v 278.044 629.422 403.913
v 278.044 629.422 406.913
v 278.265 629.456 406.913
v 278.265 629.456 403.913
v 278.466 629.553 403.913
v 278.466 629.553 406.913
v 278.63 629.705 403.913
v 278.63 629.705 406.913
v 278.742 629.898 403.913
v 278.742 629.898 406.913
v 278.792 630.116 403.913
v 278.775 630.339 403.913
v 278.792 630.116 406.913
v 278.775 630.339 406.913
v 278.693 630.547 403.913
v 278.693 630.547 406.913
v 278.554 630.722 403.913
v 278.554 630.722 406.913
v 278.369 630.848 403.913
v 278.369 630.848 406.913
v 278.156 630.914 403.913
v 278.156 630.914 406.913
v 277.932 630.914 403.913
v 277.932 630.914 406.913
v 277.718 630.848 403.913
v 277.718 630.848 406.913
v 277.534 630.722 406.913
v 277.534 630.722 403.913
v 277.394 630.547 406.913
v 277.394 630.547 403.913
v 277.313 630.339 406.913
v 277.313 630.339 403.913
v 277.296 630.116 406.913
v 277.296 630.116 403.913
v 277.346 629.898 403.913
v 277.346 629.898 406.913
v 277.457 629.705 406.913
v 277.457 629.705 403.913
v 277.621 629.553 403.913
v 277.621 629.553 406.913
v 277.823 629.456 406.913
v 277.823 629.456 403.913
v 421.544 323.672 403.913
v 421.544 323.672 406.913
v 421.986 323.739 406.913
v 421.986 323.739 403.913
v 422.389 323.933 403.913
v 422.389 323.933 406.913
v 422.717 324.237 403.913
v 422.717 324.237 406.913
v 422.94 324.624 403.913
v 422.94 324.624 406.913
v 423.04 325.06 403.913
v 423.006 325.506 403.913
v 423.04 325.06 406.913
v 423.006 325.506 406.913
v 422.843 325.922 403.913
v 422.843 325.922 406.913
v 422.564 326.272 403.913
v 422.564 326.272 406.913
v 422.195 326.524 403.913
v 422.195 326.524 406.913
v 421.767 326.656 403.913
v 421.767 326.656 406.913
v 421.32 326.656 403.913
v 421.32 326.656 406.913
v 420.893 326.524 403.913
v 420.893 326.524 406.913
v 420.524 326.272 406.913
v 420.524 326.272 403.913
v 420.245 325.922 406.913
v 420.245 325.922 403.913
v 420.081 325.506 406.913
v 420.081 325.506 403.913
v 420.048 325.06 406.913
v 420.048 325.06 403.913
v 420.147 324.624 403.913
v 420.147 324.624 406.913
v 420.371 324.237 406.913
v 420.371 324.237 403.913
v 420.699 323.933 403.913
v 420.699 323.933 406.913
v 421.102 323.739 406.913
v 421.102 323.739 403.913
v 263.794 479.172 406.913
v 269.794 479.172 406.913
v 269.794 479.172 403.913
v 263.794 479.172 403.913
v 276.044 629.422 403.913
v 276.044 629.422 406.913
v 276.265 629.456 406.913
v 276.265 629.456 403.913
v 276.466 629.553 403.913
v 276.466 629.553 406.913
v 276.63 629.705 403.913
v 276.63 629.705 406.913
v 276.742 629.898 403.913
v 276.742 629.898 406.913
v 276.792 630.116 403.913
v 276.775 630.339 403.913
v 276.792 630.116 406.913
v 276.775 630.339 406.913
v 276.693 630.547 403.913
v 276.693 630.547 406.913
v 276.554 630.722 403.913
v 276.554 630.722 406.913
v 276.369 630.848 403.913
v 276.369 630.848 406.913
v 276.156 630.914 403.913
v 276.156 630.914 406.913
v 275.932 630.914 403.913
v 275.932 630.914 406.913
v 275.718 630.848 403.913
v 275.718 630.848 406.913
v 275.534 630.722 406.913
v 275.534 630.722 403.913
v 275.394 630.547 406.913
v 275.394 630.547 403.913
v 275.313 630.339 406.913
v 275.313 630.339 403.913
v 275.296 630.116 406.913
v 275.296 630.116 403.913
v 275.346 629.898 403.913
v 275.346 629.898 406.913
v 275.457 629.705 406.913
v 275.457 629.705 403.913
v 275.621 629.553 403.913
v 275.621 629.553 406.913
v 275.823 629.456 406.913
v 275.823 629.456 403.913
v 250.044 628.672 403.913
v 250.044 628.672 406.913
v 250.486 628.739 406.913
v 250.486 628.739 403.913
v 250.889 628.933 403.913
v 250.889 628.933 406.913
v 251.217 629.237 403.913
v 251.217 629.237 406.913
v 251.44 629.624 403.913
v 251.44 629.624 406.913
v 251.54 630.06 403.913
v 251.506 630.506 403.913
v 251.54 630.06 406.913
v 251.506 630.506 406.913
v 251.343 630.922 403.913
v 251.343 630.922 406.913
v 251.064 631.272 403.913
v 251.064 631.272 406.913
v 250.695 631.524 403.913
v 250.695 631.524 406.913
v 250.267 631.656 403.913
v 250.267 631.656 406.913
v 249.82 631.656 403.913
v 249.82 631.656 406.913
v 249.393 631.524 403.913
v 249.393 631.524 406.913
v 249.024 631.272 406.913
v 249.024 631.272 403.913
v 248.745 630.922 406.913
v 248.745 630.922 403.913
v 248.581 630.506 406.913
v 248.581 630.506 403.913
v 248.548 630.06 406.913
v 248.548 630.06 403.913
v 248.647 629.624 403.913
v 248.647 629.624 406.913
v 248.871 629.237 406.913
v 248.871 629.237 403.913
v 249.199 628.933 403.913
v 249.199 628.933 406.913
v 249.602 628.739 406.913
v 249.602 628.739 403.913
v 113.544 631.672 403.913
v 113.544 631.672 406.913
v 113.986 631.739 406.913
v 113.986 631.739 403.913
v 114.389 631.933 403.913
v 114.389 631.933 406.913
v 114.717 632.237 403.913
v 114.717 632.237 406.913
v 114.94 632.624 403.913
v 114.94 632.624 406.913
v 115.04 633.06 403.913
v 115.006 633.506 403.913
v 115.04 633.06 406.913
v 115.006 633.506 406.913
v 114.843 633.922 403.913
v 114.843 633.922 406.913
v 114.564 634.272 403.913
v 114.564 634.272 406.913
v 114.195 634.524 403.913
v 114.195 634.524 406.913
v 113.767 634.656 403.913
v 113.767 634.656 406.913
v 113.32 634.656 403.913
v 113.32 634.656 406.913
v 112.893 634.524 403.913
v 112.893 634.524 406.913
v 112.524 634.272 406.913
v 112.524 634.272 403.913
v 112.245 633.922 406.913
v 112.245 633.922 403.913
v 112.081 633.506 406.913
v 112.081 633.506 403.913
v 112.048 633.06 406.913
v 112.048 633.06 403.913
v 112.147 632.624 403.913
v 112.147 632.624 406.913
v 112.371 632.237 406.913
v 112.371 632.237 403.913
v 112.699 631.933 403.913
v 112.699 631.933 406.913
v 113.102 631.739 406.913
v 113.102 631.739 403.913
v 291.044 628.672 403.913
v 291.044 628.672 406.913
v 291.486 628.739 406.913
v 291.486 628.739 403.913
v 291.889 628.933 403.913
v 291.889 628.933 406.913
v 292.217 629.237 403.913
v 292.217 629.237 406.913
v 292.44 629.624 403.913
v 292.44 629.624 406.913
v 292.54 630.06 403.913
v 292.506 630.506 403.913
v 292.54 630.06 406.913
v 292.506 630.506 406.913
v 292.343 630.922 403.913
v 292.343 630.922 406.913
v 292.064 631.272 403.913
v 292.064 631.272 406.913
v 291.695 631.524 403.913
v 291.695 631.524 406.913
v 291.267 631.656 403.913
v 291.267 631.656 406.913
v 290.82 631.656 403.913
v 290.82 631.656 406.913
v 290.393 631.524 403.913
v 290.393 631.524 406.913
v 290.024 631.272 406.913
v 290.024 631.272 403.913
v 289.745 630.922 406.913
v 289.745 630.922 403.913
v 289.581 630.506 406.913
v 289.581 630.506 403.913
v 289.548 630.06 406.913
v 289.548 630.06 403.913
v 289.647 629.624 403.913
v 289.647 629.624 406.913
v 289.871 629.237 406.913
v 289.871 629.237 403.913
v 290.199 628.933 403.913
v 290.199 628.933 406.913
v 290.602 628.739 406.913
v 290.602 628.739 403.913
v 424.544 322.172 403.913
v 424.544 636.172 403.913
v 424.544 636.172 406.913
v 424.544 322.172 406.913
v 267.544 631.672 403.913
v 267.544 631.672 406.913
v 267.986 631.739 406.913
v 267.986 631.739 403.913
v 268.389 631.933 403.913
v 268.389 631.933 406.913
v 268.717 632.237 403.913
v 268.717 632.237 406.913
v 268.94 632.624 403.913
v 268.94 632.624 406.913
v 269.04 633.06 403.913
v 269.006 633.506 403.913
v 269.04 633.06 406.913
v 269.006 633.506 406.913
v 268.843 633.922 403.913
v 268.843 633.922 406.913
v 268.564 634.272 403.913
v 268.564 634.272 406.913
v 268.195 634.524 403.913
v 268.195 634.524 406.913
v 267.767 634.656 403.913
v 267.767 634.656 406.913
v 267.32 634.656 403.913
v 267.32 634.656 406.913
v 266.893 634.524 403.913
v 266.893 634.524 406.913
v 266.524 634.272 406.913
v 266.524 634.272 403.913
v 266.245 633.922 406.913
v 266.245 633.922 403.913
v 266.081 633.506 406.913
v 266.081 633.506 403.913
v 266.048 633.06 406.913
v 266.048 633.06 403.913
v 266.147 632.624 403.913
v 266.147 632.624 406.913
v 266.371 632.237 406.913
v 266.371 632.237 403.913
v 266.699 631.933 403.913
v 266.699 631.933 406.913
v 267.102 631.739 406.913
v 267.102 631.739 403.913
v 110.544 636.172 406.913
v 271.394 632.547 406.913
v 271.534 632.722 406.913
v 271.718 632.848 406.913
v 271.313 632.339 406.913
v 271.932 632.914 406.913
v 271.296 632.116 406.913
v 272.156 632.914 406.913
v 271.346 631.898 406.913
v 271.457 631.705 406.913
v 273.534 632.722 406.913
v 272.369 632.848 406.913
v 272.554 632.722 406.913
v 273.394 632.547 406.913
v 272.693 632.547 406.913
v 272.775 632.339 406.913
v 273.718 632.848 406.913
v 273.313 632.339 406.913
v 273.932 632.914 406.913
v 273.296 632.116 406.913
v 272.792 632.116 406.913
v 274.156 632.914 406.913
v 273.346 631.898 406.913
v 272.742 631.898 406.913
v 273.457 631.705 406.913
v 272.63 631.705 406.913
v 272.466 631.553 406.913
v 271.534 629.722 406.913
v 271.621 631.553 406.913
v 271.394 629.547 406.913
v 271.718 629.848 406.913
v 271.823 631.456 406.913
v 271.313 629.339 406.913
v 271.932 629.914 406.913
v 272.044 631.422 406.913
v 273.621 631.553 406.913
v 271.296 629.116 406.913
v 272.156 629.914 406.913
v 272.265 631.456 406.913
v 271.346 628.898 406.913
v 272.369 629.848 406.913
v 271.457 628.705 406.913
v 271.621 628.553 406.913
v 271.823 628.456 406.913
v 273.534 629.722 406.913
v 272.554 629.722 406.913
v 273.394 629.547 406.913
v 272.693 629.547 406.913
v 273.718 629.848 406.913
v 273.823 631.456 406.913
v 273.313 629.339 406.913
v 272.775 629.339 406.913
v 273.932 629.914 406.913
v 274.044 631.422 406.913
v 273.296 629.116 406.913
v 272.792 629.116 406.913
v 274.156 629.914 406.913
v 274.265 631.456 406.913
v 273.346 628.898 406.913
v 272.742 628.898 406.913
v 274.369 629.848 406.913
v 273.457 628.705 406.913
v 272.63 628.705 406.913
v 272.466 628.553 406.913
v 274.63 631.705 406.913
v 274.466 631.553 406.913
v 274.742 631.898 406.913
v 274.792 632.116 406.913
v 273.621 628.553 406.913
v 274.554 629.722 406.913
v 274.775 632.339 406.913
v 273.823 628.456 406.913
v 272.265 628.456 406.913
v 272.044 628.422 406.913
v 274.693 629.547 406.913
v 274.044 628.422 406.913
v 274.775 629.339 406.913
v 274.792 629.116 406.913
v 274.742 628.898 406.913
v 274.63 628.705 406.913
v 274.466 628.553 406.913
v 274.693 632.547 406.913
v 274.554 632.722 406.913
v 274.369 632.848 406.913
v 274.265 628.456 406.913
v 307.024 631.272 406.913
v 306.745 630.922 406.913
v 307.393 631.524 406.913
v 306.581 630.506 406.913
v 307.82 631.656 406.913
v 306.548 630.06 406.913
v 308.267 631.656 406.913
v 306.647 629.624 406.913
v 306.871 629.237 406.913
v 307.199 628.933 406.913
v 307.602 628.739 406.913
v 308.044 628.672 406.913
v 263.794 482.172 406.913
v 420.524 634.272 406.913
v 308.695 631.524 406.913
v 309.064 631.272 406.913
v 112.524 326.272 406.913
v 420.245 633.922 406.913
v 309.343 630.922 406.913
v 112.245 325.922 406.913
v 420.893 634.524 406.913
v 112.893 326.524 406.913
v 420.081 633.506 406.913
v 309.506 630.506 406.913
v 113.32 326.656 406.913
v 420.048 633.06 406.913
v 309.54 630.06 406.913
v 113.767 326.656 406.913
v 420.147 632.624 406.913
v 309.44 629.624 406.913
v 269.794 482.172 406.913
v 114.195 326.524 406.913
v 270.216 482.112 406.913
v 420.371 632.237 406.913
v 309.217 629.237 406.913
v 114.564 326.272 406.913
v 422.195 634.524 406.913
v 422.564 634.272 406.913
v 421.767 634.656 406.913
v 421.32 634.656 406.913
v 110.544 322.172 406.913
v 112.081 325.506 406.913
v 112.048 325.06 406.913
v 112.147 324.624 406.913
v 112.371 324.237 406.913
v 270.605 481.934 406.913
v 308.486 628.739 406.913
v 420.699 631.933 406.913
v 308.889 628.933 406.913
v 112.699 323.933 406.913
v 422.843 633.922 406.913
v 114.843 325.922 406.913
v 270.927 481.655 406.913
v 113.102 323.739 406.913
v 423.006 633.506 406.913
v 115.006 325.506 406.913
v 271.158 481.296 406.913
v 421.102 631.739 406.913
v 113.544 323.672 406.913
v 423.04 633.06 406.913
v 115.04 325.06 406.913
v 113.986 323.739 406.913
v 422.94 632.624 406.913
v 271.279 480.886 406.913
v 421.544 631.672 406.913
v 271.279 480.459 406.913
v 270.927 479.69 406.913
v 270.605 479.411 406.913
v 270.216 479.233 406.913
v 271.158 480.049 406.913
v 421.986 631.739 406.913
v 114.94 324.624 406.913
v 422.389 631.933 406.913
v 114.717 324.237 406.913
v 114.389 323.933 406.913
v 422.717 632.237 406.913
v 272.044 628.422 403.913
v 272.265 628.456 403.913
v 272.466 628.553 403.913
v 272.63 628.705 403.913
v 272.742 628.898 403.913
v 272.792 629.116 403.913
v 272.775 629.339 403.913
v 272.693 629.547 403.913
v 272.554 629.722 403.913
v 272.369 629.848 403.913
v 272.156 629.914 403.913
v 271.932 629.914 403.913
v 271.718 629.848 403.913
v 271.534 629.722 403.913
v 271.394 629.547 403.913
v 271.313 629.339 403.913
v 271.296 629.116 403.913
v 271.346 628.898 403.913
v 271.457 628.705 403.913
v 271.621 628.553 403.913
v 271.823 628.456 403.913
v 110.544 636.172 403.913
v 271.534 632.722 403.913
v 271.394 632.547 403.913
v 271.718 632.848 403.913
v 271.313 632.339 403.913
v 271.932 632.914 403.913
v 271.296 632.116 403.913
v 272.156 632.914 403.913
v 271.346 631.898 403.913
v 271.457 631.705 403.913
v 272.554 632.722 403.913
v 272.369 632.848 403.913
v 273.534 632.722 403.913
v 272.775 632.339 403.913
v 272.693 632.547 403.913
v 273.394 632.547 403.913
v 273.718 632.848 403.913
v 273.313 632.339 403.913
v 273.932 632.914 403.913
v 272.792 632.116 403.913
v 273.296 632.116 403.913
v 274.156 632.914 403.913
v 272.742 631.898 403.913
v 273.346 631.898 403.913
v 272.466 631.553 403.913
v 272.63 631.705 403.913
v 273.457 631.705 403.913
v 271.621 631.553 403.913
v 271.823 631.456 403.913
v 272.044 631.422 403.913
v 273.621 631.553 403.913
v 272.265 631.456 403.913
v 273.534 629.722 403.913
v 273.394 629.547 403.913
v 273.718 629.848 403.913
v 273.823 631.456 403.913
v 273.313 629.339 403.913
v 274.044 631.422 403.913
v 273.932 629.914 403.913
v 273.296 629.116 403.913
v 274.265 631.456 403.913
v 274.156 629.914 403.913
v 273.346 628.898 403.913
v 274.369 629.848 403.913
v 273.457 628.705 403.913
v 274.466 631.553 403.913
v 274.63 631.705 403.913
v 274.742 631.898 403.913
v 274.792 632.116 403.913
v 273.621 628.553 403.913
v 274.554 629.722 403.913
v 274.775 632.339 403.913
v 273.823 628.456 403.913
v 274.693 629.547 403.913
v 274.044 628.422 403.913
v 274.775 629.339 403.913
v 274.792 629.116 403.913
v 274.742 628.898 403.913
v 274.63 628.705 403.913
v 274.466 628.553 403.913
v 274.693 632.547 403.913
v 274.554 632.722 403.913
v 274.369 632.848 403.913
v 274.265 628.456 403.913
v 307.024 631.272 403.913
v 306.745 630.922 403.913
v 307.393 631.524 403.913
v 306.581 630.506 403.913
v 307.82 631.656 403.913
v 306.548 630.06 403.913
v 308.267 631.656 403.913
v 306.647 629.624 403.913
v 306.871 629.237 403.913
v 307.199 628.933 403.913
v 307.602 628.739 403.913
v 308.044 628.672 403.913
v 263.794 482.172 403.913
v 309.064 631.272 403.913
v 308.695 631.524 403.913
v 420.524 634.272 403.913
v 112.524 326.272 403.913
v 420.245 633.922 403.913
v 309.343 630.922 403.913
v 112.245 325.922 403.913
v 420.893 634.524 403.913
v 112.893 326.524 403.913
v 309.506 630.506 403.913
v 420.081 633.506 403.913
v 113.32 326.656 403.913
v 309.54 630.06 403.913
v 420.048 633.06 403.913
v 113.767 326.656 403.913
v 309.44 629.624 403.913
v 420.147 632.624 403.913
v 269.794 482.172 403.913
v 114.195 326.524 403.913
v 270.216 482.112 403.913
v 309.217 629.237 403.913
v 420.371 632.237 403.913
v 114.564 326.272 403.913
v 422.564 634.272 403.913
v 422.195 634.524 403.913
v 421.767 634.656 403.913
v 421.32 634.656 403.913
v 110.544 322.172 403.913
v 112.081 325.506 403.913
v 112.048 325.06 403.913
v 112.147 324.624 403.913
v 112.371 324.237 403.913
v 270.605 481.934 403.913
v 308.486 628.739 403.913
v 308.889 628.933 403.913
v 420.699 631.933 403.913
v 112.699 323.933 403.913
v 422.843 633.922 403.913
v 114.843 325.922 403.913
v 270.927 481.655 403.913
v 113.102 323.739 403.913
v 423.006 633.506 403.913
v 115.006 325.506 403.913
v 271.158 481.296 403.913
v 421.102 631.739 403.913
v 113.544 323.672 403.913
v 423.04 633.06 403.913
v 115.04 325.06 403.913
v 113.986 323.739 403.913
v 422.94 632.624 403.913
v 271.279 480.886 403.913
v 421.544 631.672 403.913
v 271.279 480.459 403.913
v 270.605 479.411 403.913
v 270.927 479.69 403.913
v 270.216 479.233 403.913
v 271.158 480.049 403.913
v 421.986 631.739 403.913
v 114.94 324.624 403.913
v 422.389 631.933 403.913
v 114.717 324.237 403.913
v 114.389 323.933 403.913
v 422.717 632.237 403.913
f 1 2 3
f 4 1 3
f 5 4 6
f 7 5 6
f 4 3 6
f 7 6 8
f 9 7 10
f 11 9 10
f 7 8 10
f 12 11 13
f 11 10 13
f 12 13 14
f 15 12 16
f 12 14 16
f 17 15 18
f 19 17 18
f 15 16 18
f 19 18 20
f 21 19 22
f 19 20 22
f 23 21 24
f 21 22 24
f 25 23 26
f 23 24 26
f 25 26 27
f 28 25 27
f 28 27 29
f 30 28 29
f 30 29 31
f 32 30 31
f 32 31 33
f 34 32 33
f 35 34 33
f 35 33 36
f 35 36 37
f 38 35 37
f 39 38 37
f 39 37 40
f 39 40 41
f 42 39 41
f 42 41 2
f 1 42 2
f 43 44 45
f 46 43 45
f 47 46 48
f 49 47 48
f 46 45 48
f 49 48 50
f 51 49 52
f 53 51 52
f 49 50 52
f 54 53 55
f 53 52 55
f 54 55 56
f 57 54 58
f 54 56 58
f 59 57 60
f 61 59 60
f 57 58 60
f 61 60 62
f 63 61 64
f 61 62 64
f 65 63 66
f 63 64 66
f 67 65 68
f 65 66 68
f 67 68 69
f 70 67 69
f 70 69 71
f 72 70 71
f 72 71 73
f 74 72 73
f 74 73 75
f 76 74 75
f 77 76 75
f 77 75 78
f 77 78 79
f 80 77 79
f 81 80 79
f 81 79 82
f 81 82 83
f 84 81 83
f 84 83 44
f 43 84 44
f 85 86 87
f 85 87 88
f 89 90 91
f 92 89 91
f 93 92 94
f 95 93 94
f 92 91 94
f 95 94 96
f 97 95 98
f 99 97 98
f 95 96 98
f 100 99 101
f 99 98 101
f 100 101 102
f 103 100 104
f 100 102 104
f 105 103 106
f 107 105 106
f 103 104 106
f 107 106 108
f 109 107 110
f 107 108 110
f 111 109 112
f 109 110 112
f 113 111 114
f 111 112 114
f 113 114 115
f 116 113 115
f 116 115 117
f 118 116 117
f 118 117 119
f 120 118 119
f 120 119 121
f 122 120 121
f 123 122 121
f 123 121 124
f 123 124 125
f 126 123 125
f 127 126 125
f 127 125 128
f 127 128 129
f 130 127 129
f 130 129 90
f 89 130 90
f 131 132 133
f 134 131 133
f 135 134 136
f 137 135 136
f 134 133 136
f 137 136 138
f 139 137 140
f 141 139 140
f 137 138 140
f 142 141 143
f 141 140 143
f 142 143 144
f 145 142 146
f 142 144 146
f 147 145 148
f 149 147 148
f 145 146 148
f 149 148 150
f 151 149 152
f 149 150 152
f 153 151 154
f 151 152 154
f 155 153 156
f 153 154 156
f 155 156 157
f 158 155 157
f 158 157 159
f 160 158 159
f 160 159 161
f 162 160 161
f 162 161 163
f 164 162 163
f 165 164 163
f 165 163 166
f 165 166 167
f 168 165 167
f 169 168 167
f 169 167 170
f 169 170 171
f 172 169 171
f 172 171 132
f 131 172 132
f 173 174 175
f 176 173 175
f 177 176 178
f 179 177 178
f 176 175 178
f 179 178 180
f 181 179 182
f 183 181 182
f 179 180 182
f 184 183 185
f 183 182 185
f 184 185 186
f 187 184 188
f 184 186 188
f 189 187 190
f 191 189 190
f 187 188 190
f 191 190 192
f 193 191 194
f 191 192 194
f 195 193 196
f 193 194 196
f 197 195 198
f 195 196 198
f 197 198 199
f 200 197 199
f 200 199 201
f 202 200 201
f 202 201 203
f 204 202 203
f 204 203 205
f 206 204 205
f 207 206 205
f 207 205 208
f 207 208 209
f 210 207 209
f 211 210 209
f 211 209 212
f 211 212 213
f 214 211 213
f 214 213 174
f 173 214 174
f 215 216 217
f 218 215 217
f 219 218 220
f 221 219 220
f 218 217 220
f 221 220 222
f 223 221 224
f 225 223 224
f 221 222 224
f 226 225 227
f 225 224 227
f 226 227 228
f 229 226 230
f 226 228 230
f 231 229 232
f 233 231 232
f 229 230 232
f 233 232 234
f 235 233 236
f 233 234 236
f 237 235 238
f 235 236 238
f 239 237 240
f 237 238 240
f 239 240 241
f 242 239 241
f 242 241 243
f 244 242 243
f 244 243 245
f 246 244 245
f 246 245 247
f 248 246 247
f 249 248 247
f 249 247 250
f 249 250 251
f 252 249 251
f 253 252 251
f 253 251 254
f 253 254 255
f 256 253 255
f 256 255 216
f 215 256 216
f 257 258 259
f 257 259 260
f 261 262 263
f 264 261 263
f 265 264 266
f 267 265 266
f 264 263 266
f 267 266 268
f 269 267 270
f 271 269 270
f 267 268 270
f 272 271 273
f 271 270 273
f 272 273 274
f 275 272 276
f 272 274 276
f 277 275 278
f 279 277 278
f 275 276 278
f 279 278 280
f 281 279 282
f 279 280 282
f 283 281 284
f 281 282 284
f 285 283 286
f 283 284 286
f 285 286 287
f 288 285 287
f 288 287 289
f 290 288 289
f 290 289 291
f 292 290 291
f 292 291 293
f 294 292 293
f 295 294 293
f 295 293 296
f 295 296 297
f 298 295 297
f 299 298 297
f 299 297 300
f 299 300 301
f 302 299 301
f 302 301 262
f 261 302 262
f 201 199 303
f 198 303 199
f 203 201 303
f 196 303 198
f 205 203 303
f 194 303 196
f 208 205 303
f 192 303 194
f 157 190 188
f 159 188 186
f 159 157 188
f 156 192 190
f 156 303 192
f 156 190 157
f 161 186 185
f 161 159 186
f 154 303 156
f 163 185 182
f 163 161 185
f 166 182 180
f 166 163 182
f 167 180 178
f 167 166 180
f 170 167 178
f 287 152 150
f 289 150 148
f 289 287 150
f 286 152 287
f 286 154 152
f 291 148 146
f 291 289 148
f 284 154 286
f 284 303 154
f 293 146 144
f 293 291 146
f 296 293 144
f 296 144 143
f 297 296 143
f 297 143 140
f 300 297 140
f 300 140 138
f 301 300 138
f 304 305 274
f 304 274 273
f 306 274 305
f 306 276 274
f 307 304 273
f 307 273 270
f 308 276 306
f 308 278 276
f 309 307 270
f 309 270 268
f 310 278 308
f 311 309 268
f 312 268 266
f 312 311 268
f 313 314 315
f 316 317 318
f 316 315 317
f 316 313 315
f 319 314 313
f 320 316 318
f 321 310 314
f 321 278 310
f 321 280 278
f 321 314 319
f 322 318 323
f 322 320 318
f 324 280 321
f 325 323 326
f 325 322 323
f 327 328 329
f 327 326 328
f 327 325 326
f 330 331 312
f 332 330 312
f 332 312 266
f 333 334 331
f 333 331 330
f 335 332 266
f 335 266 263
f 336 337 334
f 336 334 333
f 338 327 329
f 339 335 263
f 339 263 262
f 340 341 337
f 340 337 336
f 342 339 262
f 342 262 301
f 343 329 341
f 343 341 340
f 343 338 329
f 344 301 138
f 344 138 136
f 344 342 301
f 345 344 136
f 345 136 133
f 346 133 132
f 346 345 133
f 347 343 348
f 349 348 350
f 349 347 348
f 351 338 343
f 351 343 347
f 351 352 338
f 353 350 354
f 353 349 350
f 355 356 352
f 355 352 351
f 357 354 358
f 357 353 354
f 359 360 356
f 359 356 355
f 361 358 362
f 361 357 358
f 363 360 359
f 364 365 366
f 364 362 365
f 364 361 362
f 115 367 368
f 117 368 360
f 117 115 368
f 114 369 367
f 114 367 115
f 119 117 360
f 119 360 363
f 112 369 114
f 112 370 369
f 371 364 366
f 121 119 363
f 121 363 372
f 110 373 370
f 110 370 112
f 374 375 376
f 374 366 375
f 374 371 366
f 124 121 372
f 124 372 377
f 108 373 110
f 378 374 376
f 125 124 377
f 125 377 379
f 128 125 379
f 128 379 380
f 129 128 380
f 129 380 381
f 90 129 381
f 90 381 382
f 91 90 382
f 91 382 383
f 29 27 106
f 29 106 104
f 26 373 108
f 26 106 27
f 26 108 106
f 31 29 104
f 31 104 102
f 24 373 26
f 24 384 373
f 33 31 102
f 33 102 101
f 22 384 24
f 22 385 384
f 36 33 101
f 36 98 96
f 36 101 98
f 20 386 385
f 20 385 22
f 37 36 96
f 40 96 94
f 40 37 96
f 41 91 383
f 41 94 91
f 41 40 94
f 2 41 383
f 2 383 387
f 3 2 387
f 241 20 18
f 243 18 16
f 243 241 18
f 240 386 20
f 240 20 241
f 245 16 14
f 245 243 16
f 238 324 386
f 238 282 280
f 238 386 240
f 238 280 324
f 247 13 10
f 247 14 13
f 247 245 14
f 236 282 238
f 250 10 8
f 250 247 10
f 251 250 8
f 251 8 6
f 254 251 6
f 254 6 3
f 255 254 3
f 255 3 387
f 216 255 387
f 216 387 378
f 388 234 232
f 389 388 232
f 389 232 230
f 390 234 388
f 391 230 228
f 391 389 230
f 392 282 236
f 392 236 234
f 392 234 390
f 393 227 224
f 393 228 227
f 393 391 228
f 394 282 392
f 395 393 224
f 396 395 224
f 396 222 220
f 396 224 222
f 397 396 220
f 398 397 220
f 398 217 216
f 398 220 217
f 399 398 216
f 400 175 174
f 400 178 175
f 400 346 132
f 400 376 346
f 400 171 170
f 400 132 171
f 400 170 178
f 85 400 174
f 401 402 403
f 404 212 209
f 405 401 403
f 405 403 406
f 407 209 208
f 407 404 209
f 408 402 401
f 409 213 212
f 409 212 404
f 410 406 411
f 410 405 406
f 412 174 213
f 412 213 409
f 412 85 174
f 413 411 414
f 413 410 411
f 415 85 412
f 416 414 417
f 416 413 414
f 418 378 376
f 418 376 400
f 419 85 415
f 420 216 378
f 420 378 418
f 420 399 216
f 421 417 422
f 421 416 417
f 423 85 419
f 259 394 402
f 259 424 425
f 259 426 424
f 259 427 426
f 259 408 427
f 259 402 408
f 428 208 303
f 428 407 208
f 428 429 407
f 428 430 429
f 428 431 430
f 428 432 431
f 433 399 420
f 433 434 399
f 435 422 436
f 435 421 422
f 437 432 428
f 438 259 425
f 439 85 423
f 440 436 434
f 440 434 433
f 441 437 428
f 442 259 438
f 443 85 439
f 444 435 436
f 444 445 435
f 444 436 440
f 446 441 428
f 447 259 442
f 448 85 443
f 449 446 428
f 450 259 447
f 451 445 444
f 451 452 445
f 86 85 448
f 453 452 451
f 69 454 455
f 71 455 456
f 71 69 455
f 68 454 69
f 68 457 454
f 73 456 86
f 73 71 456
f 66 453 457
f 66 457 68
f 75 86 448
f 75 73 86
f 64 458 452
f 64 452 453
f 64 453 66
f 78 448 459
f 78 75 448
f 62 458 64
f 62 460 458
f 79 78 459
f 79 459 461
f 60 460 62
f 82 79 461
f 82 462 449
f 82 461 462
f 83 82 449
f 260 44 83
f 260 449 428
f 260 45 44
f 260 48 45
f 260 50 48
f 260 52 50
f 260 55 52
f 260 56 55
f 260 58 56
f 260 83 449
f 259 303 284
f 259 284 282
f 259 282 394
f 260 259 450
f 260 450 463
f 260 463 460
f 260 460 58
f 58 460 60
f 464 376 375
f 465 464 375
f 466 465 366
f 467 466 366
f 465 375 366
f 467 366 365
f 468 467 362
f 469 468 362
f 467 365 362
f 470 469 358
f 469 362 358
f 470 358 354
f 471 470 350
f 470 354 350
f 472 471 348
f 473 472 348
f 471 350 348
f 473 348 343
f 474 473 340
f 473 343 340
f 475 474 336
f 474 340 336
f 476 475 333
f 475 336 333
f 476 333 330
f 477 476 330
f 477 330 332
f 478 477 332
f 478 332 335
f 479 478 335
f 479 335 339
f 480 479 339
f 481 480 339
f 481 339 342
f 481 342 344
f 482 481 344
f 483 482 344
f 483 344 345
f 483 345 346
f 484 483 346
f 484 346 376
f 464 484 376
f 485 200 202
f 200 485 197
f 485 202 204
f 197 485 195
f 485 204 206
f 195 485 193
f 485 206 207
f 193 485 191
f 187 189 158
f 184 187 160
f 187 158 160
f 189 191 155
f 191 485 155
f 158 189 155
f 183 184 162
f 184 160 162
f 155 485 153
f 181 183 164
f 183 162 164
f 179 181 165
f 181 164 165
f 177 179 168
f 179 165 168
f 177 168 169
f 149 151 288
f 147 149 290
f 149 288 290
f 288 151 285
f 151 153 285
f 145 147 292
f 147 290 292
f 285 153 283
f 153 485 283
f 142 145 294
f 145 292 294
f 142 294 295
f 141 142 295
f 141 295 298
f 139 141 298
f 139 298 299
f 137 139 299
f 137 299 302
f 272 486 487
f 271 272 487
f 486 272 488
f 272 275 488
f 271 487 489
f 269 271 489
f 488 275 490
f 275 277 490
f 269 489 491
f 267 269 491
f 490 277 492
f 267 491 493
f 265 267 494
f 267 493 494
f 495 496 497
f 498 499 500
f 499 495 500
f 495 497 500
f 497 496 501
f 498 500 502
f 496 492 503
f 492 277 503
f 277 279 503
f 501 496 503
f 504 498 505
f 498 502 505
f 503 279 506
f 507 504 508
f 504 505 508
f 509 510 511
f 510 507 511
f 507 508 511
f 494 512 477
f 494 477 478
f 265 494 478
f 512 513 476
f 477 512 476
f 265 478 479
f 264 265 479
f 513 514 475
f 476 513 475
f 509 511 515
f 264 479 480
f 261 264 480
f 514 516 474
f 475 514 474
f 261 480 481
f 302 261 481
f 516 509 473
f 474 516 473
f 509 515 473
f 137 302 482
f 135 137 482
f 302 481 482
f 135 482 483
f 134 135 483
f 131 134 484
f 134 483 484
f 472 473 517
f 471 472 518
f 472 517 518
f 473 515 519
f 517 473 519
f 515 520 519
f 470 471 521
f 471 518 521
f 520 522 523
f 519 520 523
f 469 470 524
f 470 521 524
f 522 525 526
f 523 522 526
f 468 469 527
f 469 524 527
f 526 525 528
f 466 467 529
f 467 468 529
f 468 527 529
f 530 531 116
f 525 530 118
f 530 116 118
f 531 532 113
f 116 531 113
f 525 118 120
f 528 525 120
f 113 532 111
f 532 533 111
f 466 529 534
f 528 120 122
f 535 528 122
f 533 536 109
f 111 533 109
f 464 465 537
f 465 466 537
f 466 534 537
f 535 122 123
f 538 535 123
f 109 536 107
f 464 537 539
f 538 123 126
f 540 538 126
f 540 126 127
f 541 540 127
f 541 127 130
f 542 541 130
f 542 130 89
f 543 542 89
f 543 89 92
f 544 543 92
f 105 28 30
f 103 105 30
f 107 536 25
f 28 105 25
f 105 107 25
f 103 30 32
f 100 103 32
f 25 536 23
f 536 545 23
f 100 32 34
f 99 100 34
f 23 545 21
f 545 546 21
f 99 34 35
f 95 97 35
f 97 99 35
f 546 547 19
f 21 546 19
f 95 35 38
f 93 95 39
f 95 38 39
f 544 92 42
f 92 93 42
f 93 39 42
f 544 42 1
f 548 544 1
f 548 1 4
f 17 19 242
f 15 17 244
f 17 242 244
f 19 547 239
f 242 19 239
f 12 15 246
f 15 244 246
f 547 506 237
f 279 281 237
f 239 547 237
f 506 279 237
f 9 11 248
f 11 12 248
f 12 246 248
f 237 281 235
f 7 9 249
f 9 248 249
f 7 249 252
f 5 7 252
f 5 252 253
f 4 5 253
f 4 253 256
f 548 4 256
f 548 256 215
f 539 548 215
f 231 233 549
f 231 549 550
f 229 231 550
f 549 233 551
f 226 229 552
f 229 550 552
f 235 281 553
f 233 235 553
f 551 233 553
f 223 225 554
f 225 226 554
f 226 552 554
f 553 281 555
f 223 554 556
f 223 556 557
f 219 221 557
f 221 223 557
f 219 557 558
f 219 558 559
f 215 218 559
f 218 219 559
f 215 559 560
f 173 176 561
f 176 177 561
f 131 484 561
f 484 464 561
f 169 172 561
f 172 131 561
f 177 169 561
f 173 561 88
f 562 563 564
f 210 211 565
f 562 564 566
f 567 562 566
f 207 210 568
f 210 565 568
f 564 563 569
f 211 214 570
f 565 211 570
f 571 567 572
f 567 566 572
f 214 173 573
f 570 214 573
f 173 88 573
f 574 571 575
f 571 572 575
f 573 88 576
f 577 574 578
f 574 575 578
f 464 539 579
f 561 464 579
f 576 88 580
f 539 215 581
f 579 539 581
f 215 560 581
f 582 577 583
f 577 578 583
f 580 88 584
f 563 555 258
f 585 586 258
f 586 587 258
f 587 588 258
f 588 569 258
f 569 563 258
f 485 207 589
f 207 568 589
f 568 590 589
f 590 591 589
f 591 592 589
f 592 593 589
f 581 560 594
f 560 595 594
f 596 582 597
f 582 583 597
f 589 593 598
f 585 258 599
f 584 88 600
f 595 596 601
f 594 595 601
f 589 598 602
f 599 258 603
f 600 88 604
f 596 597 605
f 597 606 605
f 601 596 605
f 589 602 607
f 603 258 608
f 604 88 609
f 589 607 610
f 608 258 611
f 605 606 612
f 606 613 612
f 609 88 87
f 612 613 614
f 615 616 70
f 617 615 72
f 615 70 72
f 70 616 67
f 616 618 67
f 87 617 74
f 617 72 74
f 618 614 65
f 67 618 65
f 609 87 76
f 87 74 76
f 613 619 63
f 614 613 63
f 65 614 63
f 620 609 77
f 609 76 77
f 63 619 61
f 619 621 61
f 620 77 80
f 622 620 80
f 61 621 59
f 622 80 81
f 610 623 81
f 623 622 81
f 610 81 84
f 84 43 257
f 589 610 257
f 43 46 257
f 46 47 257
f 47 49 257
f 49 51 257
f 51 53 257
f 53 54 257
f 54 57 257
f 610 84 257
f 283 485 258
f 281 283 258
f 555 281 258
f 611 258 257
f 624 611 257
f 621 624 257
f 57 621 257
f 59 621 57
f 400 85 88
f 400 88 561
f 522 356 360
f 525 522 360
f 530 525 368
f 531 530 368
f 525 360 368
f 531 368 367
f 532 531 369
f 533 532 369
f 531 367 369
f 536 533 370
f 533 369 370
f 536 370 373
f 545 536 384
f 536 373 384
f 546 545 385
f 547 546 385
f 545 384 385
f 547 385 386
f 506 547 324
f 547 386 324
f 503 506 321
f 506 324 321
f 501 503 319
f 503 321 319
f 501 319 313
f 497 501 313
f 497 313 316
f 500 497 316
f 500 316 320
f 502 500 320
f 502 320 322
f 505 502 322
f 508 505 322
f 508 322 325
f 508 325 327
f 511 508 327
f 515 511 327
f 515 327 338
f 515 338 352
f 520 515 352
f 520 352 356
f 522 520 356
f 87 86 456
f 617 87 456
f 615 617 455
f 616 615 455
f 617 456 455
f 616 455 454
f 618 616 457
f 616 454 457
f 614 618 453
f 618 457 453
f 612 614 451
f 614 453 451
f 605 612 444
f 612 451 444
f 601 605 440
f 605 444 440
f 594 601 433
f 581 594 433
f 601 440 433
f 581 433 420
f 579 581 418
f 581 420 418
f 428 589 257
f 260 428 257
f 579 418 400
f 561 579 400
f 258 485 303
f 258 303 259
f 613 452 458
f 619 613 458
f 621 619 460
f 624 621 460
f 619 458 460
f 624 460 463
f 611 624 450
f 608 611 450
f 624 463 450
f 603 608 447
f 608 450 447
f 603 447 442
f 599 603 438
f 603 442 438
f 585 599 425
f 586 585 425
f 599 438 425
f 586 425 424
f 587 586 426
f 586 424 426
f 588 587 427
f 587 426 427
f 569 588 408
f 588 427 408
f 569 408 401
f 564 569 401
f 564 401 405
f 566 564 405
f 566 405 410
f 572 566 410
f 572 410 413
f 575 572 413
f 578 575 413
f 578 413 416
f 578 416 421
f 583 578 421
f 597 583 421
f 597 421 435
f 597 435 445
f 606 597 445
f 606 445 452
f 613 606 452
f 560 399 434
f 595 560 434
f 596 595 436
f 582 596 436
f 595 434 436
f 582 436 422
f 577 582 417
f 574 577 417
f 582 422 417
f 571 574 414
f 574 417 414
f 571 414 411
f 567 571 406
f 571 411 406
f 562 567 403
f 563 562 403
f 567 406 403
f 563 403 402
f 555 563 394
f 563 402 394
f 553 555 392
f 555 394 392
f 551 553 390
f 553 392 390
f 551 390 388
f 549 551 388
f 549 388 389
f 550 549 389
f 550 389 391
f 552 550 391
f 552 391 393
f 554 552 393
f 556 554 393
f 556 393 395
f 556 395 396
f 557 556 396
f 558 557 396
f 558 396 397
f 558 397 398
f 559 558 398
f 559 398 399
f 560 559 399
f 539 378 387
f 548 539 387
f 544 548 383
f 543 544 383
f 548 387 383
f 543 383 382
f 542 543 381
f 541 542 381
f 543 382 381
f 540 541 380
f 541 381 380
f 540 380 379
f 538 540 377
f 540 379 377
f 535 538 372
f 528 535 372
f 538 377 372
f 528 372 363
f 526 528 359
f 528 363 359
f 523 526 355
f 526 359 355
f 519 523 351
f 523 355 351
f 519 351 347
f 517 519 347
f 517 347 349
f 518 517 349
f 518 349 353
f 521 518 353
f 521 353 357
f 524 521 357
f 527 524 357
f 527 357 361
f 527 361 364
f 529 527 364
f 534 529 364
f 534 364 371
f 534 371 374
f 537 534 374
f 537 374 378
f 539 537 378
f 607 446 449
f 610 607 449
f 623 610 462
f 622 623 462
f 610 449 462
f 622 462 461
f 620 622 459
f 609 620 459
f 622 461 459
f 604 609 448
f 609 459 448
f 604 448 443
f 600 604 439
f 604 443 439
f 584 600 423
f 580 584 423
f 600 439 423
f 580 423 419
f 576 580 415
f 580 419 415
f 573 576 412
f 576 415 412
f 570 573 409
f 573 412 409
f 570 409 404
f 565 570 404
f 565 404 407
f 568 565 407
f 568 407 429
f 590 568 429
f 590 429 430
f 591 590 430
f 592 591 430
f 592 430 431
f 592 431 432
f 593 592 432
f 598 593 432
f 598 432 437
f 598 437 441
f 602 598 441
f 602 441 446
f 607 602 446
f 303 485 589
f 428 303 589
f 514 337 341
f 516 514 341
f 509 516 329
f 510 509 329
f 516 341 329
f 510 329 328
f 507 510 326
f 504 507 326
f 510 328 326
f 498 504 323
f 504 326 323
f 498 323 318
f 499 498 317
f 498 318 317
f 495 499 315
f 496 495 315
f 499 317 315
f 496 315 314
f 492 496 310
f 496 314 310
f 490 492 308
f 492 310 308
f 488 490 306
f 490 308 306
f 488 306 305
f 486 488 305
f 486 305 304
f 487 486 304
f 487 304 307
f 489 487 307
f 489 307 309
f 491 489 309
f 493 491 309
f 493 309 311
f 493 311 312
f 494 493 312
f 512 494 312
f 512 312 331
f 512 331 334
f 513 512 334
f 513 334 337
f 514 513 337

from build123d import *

# Parameters (mm, degrees)
SKETCH001_W       = 314
SKETCH001_H       = 314
PAD_DEPTH         = 3
SKETCH_W          = 4
SKETCH_H          = 15
SKETCH_W_2        = 2
SKETCH_H_2        = 4
PAD001_DEPTH      = 0.3
SKETCH002_R       = 1.5
SKETCH002_R_2     = 0.75
POCKET_DEPTH      = 3.001
POCKET_DEPTH_BACK = -0.001


with BuildPart() as part:
    # Sketch001 → Pad (new body)
    with BuildSketch(Plane(origin=(110.543777, 322.172485, 403.912964), x_dir=(0, -1, 0), z_dir=(0, 0, 1))):
        with Locations((-157, 157)):
            Rectangle(SKETCH001_W, SKETCH001_H)
    extrude(amount=PAD_DEPTH)

    # Sketch → Pad001 (new body)
    with BuildSketch(Plane(origin=(110.543777, 322.172485, 406.912964), x_dir=(0, -1, 0), z_dir=(0, 0, 1))):
        with Locations((-308, 140)):
            Rectangle(SKETCH_W, SKETCH_H)
        with Locations((-308, 180)):
            Rectangle(SKETCH_W, SKETCH_H)
        with Locations((-308, 198)):
            Rectangle(SKETCH_W, SKETCH_H)
        with Locations((-310, 162.5)):
            Rectangle(SKETCH_W_2, SKETCH_H_2)
        with Locations((-307, 162.5)):
            Rectangle(SKETCH_W_2, SKETCH_H_2)
        with Locations((-308, 166.51)):
            Rectangle(SKETCH_W_2, SKETCH_H_2)
    extrude(amount=-PAD001_DEPTH)

    # Sketch002 → Pocket (cut, two sides)
    with BuildSketch(Plane(origin=(110.543777, 322.172485, 406.912964), x_dir=(0, -1, 0), z_dir=(0, 0, 1))) as pocket_sk:
        with Locations((-308, 139.5)):
            Circle(SKETCH002_R)
        with Locations((-311, 157)):
            Circle(SKETCH002_R)
        with Locations((-310, 161.5)):
            Circle(SKETCH002_R_2)
        with Locations((-310, 163.5)):
            Circle(SKETCH002_R_2)
        with Locations((-307, 161.5)):
            Circle(SKETCH002_R_2)
        with Locations((-307, 163.5)):
            Circle(SKETCH002_R_2)
        with Locations((-308, 167.5)):
            Circle(SKETCH002_R_2)
        with Locations((-308, 165.5)):
            Circle(SKETCH002_R_2)
        with Locations((-308, 180.5)):
            Circle(SKETCH002_R)
        with Locations((-308, 197.5)):
            Circle(SKETCH002_R)
        with Locations((-311, 311)):
            Circle(SKETCH002_R)
        with Locations((-311, 3)):
            Circle(SKETCH002_R)
        with Locations((-3, 3)):
            Circle(SKETCH002_R)
        with Locations((-3, 311)):
            Circle(SKETCH002_R)
        with BuildLine():
            Line((-157, 159.25), (-157, 153.25))
            Line((-157, 153.25), (-160, 153.25))
            Line((-160, 159.25), (-160, 153.25))
            ThreePointArc((-157, 159.25), (-158.5, 160.75), (-160, 159.25))
        make_face()
    extrude(amount=-POCKET_DEPTH, mode=Mode.SUBTRACT)
    extrude(pocket_sk.sketch, amount=-POCKET_DEPTH_BACK, mode=Mode.SUBTRACT)


solid = part.part
